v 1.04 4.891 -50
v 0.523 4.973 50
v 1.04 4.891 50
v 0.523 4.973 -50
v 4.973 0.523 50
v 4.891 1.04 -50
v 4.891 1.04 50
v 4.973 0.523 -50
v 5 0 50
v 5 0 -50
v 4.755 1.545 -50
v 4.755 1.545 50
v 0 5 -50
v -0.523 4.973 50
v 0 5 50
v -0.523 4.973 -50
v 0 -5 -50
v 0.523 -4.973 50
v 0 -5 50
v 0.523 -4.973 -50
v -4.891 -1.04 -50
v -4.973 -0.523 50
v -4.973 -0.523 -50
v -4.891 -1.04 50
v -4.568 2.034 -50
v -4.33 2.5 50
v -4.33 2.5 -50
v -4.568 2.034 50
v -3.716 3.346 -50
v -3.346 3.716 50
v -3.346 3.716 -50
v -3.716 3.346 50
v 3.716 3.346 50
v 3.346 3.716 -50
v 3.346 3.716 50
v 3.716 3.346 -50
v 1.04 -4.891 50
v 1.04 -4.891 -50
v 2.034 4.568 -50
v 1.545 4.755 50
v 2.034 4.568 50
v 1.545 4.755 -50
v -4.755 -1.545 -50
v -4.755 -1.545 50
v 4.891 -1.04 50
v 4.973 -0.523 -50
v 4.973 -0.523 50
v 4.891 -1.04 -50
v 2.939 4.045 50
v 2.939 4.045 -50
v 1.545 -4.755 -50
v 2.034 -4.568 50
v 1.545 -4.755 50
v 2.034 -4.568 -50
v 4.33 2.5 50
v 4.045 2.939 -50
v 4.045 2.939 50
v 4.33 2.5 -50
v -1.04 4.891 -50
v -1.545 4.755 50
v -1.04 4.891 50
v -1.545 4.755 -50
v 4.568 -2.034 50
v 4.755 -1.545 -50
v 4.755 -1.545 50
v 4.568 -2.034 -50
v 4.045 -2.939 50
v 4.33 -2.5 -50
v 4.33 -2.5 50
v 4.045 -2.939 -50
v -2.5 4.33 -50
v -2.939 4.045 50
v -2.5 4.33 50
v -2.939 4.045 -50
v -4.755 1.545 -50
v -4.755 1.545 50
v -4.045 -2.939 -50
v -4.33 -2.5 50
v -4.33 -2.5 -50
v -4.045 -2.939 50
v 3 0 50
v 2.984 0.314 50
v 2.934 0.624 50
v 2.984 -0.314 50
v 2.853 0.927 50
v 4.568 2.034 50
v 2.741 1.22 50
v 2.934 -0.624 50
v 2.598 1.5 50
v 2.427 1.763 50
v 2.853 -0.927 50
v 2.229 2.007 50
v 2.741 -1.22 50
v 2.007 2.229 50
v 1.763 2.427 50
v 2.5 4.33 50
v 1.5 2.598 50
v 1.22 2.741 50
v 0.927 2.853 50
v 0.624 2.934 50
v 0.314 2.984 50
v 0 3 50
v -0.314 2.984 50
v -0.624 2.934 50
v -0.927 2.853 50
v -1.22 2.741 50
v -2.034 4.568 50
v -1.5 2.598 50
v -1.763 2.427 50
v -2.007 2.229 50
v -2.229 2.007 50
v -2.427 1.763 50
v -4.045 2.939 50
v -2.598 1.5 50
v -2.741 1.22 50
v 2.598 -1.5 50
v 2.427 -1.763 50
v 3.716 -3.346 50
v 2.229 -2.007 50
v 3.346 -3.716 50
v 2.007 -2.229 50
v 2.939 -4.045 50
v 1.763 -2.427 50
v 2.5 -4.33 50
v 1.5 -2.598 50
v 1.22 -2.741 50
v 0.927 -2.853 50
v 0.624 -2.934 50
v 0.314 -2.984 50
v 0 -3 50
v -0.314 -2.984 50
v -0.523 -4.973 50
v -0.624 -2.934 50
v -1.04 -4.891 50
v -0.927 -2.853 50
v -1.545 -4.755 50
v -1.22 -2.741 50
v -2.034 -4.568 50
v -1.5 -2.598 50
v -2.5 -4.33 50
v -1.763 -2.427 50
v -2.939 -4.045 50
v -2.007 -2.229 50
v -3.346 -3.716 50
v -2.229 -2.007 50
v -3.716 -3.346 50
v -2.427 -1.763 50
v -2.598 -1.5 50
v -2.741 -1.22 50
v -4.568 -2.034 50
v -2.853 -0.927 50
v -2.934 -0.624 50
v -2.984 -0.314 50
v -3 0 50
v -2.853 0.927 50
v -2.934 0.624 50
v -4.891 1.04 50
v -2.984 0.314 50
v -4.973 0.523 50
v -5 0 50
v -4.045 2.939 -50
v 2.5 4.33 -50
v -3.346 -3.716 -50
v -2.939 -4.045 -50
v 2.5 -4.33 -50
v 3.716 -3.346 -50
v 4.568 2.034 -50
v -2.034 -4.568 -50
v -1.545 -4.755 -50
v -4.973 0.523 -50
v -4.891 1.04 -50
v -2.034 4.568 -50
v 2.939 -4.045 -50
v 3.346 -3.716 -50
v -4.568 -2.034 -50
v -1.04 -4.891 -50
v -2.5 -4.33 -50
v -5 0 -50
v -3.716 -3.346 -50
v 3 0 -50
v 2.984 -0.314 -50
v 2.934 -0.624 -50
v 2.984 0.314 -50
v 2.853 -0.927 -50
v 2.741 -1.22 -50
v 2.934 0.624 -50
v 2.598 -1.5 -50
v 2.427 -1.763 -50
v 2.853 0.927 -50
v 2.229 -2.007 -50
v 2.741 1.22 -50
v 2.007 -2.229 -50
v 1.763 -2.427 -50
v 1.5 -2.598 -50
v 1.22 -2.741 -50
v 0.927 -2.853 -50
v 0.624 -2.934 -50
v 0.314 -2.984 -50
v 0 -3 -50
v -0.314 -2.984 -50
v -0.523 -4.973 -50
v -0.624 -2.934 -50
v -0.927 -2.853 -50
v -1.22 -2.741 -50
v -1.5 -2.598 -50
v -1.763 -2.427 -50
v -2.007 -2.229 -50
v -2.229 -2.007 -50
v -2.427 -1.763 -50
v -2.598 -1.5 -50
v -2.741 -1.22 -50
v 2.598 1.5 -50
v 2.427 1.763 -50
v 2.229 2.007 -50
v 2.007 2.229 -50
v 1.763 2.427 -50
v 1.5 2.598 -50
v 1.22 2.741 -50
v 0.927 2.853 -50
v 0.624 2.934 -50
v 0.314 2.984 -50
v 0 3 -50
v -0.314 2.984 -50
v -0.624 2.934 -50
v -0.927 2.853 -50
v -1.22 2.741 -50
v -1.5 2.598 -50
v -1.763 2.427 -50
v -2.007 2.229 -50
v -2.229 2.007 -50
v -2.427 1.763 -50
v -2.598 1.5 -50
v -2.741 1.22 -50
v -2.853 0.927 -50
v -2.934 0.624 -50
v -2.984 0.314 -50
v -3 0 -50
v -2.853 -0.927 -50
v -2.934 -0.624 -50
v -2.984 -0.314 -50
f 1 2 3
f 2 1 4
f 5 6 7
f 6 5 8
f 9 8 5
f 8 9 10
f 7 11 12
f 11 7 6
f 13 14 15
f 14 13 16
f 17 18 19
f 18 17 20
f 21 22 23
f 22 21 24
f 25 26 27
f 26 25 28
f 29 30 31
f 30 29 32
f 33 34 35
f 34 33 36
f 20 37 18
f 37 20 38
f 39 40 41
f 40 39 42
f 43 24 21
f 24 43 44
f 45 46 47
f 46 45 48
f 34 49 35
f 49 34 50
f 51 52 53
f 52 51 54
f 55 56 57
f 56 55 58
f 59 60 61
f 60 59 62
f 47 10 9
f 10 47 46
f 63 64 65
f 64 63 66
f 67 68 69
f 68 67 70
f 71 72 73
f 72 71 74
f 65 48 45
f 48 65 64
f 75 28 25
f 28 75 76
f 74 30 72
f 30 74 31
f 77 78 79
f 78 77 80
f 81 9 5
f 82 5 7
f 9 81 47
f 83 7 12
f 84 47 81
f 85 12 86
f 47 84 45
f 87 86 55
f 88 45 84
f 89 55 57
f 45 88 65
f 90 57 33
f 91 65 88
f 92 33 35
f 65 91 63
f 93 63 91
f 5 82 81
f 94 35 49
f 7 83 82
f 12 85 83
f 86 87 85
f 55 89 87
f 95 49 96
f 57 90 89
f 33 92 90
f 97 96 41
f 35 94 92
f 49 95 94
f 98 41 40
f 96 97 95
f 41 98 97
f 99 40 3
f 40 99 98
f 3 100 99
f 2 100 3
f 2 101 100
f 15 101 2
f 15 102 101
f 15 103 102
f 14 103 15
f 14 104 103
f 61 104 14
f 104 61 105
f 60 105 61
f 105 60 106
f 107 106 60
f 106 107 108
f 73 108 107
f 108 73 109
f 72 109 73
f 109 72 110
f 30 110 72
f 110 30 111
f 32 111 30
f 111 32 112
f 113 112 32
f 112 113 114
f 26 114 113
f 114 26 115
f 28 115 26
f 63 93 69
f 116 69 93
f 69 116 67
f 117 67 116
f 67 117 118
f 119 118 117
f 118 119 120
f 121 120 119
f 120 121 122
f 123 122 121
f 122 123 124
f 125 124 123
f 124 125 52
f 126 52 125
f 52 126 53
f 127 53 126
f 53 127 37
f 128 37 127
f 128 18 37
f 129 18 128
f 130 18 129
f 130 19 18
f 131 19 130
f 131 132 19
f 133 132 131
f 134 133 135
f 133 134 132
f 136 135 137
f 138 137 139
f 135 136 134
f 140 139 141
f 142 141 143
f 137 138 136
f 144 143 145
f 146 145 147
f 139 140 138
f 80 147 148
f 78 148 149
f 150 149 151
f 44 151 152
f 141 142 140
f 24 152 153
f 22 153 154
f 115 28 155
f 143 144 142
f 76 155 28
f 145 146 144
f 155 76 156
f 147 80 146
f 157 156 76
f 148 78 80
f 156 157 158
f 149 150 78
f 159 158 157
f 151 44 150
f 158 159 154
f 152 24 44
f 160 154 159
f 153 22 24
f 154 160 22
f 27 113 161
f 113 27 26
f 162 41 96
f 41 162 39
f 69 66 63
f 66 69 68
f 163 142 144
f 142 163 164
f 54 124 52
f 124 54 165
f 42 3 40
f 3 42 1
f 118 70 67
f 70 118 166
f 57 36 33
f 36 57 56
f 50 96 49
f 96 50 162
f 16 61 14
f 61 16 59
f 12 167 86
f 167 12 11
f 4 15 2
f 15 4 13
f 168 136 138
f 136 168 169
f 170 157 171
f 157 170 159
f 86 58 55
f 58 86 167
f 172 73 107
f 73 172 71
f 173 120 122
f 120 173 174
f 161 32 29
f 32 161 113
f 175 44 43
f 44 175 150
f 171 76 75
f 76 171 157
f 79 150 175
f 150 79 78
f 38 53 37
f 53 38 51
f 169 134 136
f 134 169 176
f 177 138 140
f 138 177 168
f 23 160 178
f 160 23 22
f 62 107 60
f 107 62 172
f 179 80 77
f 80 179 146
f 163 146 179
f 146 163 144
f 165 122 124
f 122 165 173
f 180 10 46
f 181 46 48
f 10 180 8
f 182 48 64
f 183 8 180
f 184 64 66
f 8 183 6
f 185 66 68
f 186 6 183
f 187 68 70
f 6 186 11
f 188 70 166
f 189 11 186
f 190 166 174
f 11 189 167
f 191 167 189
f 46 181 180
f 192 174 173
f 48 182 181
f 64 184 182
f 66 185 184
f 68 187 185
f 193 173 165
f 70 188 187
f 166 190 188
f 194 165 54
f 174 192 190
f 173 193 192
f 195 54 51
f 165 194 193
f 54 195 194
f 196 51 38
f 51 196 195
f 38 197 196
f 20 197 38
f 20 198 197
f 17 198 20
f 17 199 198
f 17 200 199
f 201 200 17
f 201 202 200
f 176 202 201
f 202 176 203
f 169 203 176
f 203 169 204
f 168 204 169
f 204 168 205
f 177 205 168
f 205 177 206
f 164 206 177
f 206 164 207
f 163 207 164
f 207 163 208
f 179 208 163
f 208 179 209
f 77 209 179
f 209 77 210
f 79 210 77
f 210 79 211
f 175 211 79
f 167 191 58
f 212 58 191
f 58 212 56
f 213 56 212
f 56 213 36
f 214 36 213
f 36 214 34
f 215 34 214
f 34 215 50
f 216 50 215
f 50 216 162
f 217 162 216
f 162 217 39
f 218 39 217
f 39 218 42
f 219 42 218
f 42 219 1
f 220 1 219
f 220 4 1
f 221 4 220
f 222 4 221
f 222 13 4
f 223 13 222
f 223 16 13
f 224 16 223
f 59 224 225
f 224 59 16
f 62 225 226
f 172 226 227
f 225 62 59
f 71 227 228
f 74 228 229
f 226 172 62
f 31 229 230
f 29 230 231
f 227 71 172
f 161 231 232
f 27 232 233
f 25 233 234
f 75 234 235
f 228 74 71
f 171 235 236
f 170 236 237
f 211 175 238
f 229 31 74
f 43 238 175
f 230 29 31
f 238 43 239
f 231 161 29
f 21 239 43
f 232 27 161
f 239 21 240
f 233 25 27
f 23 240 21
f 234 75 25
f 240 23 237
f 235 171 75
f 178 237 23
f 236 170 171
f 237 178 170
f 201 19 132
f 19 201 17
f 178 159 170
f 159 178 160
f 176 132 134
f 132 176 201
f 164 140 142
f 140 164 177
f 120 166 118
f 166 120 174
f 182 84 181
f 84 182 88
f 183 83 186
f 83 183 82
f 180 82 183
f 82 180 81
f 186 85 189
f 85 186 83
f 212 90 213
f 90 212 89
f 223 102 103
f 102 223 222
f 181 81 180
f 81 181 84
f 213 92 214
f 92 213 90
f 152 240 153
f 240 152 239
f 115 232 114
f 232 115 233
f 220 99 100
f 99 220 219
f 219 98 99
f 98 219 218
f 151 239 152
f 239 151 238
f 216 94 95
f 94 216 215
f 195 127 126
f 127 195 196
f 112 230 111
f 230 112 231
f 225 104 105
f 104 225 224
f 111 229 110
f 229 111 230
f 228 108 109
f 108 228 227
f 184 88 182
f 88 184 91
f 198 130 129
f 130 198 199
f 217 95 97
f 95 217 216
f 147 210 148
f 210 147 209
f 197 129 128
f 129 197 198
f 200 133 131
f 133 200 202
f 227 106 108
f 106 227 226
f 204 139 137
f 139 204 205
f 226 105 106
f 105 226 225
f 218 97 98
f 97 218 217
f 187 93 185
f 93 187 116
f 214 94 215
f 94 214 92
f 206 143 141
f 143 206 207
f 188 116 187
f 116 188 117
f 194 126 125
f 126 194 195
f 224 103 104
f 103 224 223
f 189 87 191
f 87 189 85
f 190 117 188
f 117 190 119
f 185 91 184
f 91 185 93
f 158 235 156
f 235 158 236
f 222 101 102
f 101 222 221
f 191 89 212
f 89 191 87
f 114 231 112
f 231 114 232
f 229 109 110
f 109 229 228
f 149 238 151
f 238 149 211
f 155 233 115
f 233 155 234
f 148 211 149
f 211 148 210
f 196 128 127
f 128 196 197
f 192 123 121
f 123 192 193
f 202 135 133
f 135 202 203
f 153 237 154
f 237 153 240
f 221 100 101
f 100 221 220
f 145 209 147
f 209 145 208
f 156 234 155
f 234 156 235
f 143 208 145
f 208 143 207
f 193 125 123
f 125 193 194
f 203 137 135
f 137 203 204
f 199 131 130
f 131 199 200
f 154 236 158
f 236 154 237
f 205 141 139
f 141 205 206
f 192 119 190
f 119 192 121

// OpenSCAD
// =========================================================
// OpenSCAD Code: 100mm Cylinder (R=5) with Central Hole (r=3)
// =========================================================

// Set fragments per rotation for smoothness (increase $fn for smoother curves)
$fn = 60;

// --- Variables ---
// Define the dimensions for easy parametric modification
cylinder_length = 100; // L = 100 mm
outer_radius = 5;      // R = 5 mm (Outer Diameter = 10 mm)
hole_radius = 3;       // r = 3 mm (Hole Diameter = 6 mm)

// The difference() function takes the first object and subtracts all subsequent objects from it.
difference() {

    // 1. Outer Cylinder (The main body)
    // 'center=true' places the object's center at [0, 0, 0] along the Z-axis,
    // making the cylinder run from Z=-50 to Z=+50.
    cylinder(
        h = cylinder_length,
        r = outer_radius,
        center = true
    );

    // 2. Inner Cylinder (The hole to be subtracted)
    // This hole runs the entire length of the main cylinder.
    cylinder(
        h = cylinder_length,
        r = hole_radius,
        center = true
    );
}
